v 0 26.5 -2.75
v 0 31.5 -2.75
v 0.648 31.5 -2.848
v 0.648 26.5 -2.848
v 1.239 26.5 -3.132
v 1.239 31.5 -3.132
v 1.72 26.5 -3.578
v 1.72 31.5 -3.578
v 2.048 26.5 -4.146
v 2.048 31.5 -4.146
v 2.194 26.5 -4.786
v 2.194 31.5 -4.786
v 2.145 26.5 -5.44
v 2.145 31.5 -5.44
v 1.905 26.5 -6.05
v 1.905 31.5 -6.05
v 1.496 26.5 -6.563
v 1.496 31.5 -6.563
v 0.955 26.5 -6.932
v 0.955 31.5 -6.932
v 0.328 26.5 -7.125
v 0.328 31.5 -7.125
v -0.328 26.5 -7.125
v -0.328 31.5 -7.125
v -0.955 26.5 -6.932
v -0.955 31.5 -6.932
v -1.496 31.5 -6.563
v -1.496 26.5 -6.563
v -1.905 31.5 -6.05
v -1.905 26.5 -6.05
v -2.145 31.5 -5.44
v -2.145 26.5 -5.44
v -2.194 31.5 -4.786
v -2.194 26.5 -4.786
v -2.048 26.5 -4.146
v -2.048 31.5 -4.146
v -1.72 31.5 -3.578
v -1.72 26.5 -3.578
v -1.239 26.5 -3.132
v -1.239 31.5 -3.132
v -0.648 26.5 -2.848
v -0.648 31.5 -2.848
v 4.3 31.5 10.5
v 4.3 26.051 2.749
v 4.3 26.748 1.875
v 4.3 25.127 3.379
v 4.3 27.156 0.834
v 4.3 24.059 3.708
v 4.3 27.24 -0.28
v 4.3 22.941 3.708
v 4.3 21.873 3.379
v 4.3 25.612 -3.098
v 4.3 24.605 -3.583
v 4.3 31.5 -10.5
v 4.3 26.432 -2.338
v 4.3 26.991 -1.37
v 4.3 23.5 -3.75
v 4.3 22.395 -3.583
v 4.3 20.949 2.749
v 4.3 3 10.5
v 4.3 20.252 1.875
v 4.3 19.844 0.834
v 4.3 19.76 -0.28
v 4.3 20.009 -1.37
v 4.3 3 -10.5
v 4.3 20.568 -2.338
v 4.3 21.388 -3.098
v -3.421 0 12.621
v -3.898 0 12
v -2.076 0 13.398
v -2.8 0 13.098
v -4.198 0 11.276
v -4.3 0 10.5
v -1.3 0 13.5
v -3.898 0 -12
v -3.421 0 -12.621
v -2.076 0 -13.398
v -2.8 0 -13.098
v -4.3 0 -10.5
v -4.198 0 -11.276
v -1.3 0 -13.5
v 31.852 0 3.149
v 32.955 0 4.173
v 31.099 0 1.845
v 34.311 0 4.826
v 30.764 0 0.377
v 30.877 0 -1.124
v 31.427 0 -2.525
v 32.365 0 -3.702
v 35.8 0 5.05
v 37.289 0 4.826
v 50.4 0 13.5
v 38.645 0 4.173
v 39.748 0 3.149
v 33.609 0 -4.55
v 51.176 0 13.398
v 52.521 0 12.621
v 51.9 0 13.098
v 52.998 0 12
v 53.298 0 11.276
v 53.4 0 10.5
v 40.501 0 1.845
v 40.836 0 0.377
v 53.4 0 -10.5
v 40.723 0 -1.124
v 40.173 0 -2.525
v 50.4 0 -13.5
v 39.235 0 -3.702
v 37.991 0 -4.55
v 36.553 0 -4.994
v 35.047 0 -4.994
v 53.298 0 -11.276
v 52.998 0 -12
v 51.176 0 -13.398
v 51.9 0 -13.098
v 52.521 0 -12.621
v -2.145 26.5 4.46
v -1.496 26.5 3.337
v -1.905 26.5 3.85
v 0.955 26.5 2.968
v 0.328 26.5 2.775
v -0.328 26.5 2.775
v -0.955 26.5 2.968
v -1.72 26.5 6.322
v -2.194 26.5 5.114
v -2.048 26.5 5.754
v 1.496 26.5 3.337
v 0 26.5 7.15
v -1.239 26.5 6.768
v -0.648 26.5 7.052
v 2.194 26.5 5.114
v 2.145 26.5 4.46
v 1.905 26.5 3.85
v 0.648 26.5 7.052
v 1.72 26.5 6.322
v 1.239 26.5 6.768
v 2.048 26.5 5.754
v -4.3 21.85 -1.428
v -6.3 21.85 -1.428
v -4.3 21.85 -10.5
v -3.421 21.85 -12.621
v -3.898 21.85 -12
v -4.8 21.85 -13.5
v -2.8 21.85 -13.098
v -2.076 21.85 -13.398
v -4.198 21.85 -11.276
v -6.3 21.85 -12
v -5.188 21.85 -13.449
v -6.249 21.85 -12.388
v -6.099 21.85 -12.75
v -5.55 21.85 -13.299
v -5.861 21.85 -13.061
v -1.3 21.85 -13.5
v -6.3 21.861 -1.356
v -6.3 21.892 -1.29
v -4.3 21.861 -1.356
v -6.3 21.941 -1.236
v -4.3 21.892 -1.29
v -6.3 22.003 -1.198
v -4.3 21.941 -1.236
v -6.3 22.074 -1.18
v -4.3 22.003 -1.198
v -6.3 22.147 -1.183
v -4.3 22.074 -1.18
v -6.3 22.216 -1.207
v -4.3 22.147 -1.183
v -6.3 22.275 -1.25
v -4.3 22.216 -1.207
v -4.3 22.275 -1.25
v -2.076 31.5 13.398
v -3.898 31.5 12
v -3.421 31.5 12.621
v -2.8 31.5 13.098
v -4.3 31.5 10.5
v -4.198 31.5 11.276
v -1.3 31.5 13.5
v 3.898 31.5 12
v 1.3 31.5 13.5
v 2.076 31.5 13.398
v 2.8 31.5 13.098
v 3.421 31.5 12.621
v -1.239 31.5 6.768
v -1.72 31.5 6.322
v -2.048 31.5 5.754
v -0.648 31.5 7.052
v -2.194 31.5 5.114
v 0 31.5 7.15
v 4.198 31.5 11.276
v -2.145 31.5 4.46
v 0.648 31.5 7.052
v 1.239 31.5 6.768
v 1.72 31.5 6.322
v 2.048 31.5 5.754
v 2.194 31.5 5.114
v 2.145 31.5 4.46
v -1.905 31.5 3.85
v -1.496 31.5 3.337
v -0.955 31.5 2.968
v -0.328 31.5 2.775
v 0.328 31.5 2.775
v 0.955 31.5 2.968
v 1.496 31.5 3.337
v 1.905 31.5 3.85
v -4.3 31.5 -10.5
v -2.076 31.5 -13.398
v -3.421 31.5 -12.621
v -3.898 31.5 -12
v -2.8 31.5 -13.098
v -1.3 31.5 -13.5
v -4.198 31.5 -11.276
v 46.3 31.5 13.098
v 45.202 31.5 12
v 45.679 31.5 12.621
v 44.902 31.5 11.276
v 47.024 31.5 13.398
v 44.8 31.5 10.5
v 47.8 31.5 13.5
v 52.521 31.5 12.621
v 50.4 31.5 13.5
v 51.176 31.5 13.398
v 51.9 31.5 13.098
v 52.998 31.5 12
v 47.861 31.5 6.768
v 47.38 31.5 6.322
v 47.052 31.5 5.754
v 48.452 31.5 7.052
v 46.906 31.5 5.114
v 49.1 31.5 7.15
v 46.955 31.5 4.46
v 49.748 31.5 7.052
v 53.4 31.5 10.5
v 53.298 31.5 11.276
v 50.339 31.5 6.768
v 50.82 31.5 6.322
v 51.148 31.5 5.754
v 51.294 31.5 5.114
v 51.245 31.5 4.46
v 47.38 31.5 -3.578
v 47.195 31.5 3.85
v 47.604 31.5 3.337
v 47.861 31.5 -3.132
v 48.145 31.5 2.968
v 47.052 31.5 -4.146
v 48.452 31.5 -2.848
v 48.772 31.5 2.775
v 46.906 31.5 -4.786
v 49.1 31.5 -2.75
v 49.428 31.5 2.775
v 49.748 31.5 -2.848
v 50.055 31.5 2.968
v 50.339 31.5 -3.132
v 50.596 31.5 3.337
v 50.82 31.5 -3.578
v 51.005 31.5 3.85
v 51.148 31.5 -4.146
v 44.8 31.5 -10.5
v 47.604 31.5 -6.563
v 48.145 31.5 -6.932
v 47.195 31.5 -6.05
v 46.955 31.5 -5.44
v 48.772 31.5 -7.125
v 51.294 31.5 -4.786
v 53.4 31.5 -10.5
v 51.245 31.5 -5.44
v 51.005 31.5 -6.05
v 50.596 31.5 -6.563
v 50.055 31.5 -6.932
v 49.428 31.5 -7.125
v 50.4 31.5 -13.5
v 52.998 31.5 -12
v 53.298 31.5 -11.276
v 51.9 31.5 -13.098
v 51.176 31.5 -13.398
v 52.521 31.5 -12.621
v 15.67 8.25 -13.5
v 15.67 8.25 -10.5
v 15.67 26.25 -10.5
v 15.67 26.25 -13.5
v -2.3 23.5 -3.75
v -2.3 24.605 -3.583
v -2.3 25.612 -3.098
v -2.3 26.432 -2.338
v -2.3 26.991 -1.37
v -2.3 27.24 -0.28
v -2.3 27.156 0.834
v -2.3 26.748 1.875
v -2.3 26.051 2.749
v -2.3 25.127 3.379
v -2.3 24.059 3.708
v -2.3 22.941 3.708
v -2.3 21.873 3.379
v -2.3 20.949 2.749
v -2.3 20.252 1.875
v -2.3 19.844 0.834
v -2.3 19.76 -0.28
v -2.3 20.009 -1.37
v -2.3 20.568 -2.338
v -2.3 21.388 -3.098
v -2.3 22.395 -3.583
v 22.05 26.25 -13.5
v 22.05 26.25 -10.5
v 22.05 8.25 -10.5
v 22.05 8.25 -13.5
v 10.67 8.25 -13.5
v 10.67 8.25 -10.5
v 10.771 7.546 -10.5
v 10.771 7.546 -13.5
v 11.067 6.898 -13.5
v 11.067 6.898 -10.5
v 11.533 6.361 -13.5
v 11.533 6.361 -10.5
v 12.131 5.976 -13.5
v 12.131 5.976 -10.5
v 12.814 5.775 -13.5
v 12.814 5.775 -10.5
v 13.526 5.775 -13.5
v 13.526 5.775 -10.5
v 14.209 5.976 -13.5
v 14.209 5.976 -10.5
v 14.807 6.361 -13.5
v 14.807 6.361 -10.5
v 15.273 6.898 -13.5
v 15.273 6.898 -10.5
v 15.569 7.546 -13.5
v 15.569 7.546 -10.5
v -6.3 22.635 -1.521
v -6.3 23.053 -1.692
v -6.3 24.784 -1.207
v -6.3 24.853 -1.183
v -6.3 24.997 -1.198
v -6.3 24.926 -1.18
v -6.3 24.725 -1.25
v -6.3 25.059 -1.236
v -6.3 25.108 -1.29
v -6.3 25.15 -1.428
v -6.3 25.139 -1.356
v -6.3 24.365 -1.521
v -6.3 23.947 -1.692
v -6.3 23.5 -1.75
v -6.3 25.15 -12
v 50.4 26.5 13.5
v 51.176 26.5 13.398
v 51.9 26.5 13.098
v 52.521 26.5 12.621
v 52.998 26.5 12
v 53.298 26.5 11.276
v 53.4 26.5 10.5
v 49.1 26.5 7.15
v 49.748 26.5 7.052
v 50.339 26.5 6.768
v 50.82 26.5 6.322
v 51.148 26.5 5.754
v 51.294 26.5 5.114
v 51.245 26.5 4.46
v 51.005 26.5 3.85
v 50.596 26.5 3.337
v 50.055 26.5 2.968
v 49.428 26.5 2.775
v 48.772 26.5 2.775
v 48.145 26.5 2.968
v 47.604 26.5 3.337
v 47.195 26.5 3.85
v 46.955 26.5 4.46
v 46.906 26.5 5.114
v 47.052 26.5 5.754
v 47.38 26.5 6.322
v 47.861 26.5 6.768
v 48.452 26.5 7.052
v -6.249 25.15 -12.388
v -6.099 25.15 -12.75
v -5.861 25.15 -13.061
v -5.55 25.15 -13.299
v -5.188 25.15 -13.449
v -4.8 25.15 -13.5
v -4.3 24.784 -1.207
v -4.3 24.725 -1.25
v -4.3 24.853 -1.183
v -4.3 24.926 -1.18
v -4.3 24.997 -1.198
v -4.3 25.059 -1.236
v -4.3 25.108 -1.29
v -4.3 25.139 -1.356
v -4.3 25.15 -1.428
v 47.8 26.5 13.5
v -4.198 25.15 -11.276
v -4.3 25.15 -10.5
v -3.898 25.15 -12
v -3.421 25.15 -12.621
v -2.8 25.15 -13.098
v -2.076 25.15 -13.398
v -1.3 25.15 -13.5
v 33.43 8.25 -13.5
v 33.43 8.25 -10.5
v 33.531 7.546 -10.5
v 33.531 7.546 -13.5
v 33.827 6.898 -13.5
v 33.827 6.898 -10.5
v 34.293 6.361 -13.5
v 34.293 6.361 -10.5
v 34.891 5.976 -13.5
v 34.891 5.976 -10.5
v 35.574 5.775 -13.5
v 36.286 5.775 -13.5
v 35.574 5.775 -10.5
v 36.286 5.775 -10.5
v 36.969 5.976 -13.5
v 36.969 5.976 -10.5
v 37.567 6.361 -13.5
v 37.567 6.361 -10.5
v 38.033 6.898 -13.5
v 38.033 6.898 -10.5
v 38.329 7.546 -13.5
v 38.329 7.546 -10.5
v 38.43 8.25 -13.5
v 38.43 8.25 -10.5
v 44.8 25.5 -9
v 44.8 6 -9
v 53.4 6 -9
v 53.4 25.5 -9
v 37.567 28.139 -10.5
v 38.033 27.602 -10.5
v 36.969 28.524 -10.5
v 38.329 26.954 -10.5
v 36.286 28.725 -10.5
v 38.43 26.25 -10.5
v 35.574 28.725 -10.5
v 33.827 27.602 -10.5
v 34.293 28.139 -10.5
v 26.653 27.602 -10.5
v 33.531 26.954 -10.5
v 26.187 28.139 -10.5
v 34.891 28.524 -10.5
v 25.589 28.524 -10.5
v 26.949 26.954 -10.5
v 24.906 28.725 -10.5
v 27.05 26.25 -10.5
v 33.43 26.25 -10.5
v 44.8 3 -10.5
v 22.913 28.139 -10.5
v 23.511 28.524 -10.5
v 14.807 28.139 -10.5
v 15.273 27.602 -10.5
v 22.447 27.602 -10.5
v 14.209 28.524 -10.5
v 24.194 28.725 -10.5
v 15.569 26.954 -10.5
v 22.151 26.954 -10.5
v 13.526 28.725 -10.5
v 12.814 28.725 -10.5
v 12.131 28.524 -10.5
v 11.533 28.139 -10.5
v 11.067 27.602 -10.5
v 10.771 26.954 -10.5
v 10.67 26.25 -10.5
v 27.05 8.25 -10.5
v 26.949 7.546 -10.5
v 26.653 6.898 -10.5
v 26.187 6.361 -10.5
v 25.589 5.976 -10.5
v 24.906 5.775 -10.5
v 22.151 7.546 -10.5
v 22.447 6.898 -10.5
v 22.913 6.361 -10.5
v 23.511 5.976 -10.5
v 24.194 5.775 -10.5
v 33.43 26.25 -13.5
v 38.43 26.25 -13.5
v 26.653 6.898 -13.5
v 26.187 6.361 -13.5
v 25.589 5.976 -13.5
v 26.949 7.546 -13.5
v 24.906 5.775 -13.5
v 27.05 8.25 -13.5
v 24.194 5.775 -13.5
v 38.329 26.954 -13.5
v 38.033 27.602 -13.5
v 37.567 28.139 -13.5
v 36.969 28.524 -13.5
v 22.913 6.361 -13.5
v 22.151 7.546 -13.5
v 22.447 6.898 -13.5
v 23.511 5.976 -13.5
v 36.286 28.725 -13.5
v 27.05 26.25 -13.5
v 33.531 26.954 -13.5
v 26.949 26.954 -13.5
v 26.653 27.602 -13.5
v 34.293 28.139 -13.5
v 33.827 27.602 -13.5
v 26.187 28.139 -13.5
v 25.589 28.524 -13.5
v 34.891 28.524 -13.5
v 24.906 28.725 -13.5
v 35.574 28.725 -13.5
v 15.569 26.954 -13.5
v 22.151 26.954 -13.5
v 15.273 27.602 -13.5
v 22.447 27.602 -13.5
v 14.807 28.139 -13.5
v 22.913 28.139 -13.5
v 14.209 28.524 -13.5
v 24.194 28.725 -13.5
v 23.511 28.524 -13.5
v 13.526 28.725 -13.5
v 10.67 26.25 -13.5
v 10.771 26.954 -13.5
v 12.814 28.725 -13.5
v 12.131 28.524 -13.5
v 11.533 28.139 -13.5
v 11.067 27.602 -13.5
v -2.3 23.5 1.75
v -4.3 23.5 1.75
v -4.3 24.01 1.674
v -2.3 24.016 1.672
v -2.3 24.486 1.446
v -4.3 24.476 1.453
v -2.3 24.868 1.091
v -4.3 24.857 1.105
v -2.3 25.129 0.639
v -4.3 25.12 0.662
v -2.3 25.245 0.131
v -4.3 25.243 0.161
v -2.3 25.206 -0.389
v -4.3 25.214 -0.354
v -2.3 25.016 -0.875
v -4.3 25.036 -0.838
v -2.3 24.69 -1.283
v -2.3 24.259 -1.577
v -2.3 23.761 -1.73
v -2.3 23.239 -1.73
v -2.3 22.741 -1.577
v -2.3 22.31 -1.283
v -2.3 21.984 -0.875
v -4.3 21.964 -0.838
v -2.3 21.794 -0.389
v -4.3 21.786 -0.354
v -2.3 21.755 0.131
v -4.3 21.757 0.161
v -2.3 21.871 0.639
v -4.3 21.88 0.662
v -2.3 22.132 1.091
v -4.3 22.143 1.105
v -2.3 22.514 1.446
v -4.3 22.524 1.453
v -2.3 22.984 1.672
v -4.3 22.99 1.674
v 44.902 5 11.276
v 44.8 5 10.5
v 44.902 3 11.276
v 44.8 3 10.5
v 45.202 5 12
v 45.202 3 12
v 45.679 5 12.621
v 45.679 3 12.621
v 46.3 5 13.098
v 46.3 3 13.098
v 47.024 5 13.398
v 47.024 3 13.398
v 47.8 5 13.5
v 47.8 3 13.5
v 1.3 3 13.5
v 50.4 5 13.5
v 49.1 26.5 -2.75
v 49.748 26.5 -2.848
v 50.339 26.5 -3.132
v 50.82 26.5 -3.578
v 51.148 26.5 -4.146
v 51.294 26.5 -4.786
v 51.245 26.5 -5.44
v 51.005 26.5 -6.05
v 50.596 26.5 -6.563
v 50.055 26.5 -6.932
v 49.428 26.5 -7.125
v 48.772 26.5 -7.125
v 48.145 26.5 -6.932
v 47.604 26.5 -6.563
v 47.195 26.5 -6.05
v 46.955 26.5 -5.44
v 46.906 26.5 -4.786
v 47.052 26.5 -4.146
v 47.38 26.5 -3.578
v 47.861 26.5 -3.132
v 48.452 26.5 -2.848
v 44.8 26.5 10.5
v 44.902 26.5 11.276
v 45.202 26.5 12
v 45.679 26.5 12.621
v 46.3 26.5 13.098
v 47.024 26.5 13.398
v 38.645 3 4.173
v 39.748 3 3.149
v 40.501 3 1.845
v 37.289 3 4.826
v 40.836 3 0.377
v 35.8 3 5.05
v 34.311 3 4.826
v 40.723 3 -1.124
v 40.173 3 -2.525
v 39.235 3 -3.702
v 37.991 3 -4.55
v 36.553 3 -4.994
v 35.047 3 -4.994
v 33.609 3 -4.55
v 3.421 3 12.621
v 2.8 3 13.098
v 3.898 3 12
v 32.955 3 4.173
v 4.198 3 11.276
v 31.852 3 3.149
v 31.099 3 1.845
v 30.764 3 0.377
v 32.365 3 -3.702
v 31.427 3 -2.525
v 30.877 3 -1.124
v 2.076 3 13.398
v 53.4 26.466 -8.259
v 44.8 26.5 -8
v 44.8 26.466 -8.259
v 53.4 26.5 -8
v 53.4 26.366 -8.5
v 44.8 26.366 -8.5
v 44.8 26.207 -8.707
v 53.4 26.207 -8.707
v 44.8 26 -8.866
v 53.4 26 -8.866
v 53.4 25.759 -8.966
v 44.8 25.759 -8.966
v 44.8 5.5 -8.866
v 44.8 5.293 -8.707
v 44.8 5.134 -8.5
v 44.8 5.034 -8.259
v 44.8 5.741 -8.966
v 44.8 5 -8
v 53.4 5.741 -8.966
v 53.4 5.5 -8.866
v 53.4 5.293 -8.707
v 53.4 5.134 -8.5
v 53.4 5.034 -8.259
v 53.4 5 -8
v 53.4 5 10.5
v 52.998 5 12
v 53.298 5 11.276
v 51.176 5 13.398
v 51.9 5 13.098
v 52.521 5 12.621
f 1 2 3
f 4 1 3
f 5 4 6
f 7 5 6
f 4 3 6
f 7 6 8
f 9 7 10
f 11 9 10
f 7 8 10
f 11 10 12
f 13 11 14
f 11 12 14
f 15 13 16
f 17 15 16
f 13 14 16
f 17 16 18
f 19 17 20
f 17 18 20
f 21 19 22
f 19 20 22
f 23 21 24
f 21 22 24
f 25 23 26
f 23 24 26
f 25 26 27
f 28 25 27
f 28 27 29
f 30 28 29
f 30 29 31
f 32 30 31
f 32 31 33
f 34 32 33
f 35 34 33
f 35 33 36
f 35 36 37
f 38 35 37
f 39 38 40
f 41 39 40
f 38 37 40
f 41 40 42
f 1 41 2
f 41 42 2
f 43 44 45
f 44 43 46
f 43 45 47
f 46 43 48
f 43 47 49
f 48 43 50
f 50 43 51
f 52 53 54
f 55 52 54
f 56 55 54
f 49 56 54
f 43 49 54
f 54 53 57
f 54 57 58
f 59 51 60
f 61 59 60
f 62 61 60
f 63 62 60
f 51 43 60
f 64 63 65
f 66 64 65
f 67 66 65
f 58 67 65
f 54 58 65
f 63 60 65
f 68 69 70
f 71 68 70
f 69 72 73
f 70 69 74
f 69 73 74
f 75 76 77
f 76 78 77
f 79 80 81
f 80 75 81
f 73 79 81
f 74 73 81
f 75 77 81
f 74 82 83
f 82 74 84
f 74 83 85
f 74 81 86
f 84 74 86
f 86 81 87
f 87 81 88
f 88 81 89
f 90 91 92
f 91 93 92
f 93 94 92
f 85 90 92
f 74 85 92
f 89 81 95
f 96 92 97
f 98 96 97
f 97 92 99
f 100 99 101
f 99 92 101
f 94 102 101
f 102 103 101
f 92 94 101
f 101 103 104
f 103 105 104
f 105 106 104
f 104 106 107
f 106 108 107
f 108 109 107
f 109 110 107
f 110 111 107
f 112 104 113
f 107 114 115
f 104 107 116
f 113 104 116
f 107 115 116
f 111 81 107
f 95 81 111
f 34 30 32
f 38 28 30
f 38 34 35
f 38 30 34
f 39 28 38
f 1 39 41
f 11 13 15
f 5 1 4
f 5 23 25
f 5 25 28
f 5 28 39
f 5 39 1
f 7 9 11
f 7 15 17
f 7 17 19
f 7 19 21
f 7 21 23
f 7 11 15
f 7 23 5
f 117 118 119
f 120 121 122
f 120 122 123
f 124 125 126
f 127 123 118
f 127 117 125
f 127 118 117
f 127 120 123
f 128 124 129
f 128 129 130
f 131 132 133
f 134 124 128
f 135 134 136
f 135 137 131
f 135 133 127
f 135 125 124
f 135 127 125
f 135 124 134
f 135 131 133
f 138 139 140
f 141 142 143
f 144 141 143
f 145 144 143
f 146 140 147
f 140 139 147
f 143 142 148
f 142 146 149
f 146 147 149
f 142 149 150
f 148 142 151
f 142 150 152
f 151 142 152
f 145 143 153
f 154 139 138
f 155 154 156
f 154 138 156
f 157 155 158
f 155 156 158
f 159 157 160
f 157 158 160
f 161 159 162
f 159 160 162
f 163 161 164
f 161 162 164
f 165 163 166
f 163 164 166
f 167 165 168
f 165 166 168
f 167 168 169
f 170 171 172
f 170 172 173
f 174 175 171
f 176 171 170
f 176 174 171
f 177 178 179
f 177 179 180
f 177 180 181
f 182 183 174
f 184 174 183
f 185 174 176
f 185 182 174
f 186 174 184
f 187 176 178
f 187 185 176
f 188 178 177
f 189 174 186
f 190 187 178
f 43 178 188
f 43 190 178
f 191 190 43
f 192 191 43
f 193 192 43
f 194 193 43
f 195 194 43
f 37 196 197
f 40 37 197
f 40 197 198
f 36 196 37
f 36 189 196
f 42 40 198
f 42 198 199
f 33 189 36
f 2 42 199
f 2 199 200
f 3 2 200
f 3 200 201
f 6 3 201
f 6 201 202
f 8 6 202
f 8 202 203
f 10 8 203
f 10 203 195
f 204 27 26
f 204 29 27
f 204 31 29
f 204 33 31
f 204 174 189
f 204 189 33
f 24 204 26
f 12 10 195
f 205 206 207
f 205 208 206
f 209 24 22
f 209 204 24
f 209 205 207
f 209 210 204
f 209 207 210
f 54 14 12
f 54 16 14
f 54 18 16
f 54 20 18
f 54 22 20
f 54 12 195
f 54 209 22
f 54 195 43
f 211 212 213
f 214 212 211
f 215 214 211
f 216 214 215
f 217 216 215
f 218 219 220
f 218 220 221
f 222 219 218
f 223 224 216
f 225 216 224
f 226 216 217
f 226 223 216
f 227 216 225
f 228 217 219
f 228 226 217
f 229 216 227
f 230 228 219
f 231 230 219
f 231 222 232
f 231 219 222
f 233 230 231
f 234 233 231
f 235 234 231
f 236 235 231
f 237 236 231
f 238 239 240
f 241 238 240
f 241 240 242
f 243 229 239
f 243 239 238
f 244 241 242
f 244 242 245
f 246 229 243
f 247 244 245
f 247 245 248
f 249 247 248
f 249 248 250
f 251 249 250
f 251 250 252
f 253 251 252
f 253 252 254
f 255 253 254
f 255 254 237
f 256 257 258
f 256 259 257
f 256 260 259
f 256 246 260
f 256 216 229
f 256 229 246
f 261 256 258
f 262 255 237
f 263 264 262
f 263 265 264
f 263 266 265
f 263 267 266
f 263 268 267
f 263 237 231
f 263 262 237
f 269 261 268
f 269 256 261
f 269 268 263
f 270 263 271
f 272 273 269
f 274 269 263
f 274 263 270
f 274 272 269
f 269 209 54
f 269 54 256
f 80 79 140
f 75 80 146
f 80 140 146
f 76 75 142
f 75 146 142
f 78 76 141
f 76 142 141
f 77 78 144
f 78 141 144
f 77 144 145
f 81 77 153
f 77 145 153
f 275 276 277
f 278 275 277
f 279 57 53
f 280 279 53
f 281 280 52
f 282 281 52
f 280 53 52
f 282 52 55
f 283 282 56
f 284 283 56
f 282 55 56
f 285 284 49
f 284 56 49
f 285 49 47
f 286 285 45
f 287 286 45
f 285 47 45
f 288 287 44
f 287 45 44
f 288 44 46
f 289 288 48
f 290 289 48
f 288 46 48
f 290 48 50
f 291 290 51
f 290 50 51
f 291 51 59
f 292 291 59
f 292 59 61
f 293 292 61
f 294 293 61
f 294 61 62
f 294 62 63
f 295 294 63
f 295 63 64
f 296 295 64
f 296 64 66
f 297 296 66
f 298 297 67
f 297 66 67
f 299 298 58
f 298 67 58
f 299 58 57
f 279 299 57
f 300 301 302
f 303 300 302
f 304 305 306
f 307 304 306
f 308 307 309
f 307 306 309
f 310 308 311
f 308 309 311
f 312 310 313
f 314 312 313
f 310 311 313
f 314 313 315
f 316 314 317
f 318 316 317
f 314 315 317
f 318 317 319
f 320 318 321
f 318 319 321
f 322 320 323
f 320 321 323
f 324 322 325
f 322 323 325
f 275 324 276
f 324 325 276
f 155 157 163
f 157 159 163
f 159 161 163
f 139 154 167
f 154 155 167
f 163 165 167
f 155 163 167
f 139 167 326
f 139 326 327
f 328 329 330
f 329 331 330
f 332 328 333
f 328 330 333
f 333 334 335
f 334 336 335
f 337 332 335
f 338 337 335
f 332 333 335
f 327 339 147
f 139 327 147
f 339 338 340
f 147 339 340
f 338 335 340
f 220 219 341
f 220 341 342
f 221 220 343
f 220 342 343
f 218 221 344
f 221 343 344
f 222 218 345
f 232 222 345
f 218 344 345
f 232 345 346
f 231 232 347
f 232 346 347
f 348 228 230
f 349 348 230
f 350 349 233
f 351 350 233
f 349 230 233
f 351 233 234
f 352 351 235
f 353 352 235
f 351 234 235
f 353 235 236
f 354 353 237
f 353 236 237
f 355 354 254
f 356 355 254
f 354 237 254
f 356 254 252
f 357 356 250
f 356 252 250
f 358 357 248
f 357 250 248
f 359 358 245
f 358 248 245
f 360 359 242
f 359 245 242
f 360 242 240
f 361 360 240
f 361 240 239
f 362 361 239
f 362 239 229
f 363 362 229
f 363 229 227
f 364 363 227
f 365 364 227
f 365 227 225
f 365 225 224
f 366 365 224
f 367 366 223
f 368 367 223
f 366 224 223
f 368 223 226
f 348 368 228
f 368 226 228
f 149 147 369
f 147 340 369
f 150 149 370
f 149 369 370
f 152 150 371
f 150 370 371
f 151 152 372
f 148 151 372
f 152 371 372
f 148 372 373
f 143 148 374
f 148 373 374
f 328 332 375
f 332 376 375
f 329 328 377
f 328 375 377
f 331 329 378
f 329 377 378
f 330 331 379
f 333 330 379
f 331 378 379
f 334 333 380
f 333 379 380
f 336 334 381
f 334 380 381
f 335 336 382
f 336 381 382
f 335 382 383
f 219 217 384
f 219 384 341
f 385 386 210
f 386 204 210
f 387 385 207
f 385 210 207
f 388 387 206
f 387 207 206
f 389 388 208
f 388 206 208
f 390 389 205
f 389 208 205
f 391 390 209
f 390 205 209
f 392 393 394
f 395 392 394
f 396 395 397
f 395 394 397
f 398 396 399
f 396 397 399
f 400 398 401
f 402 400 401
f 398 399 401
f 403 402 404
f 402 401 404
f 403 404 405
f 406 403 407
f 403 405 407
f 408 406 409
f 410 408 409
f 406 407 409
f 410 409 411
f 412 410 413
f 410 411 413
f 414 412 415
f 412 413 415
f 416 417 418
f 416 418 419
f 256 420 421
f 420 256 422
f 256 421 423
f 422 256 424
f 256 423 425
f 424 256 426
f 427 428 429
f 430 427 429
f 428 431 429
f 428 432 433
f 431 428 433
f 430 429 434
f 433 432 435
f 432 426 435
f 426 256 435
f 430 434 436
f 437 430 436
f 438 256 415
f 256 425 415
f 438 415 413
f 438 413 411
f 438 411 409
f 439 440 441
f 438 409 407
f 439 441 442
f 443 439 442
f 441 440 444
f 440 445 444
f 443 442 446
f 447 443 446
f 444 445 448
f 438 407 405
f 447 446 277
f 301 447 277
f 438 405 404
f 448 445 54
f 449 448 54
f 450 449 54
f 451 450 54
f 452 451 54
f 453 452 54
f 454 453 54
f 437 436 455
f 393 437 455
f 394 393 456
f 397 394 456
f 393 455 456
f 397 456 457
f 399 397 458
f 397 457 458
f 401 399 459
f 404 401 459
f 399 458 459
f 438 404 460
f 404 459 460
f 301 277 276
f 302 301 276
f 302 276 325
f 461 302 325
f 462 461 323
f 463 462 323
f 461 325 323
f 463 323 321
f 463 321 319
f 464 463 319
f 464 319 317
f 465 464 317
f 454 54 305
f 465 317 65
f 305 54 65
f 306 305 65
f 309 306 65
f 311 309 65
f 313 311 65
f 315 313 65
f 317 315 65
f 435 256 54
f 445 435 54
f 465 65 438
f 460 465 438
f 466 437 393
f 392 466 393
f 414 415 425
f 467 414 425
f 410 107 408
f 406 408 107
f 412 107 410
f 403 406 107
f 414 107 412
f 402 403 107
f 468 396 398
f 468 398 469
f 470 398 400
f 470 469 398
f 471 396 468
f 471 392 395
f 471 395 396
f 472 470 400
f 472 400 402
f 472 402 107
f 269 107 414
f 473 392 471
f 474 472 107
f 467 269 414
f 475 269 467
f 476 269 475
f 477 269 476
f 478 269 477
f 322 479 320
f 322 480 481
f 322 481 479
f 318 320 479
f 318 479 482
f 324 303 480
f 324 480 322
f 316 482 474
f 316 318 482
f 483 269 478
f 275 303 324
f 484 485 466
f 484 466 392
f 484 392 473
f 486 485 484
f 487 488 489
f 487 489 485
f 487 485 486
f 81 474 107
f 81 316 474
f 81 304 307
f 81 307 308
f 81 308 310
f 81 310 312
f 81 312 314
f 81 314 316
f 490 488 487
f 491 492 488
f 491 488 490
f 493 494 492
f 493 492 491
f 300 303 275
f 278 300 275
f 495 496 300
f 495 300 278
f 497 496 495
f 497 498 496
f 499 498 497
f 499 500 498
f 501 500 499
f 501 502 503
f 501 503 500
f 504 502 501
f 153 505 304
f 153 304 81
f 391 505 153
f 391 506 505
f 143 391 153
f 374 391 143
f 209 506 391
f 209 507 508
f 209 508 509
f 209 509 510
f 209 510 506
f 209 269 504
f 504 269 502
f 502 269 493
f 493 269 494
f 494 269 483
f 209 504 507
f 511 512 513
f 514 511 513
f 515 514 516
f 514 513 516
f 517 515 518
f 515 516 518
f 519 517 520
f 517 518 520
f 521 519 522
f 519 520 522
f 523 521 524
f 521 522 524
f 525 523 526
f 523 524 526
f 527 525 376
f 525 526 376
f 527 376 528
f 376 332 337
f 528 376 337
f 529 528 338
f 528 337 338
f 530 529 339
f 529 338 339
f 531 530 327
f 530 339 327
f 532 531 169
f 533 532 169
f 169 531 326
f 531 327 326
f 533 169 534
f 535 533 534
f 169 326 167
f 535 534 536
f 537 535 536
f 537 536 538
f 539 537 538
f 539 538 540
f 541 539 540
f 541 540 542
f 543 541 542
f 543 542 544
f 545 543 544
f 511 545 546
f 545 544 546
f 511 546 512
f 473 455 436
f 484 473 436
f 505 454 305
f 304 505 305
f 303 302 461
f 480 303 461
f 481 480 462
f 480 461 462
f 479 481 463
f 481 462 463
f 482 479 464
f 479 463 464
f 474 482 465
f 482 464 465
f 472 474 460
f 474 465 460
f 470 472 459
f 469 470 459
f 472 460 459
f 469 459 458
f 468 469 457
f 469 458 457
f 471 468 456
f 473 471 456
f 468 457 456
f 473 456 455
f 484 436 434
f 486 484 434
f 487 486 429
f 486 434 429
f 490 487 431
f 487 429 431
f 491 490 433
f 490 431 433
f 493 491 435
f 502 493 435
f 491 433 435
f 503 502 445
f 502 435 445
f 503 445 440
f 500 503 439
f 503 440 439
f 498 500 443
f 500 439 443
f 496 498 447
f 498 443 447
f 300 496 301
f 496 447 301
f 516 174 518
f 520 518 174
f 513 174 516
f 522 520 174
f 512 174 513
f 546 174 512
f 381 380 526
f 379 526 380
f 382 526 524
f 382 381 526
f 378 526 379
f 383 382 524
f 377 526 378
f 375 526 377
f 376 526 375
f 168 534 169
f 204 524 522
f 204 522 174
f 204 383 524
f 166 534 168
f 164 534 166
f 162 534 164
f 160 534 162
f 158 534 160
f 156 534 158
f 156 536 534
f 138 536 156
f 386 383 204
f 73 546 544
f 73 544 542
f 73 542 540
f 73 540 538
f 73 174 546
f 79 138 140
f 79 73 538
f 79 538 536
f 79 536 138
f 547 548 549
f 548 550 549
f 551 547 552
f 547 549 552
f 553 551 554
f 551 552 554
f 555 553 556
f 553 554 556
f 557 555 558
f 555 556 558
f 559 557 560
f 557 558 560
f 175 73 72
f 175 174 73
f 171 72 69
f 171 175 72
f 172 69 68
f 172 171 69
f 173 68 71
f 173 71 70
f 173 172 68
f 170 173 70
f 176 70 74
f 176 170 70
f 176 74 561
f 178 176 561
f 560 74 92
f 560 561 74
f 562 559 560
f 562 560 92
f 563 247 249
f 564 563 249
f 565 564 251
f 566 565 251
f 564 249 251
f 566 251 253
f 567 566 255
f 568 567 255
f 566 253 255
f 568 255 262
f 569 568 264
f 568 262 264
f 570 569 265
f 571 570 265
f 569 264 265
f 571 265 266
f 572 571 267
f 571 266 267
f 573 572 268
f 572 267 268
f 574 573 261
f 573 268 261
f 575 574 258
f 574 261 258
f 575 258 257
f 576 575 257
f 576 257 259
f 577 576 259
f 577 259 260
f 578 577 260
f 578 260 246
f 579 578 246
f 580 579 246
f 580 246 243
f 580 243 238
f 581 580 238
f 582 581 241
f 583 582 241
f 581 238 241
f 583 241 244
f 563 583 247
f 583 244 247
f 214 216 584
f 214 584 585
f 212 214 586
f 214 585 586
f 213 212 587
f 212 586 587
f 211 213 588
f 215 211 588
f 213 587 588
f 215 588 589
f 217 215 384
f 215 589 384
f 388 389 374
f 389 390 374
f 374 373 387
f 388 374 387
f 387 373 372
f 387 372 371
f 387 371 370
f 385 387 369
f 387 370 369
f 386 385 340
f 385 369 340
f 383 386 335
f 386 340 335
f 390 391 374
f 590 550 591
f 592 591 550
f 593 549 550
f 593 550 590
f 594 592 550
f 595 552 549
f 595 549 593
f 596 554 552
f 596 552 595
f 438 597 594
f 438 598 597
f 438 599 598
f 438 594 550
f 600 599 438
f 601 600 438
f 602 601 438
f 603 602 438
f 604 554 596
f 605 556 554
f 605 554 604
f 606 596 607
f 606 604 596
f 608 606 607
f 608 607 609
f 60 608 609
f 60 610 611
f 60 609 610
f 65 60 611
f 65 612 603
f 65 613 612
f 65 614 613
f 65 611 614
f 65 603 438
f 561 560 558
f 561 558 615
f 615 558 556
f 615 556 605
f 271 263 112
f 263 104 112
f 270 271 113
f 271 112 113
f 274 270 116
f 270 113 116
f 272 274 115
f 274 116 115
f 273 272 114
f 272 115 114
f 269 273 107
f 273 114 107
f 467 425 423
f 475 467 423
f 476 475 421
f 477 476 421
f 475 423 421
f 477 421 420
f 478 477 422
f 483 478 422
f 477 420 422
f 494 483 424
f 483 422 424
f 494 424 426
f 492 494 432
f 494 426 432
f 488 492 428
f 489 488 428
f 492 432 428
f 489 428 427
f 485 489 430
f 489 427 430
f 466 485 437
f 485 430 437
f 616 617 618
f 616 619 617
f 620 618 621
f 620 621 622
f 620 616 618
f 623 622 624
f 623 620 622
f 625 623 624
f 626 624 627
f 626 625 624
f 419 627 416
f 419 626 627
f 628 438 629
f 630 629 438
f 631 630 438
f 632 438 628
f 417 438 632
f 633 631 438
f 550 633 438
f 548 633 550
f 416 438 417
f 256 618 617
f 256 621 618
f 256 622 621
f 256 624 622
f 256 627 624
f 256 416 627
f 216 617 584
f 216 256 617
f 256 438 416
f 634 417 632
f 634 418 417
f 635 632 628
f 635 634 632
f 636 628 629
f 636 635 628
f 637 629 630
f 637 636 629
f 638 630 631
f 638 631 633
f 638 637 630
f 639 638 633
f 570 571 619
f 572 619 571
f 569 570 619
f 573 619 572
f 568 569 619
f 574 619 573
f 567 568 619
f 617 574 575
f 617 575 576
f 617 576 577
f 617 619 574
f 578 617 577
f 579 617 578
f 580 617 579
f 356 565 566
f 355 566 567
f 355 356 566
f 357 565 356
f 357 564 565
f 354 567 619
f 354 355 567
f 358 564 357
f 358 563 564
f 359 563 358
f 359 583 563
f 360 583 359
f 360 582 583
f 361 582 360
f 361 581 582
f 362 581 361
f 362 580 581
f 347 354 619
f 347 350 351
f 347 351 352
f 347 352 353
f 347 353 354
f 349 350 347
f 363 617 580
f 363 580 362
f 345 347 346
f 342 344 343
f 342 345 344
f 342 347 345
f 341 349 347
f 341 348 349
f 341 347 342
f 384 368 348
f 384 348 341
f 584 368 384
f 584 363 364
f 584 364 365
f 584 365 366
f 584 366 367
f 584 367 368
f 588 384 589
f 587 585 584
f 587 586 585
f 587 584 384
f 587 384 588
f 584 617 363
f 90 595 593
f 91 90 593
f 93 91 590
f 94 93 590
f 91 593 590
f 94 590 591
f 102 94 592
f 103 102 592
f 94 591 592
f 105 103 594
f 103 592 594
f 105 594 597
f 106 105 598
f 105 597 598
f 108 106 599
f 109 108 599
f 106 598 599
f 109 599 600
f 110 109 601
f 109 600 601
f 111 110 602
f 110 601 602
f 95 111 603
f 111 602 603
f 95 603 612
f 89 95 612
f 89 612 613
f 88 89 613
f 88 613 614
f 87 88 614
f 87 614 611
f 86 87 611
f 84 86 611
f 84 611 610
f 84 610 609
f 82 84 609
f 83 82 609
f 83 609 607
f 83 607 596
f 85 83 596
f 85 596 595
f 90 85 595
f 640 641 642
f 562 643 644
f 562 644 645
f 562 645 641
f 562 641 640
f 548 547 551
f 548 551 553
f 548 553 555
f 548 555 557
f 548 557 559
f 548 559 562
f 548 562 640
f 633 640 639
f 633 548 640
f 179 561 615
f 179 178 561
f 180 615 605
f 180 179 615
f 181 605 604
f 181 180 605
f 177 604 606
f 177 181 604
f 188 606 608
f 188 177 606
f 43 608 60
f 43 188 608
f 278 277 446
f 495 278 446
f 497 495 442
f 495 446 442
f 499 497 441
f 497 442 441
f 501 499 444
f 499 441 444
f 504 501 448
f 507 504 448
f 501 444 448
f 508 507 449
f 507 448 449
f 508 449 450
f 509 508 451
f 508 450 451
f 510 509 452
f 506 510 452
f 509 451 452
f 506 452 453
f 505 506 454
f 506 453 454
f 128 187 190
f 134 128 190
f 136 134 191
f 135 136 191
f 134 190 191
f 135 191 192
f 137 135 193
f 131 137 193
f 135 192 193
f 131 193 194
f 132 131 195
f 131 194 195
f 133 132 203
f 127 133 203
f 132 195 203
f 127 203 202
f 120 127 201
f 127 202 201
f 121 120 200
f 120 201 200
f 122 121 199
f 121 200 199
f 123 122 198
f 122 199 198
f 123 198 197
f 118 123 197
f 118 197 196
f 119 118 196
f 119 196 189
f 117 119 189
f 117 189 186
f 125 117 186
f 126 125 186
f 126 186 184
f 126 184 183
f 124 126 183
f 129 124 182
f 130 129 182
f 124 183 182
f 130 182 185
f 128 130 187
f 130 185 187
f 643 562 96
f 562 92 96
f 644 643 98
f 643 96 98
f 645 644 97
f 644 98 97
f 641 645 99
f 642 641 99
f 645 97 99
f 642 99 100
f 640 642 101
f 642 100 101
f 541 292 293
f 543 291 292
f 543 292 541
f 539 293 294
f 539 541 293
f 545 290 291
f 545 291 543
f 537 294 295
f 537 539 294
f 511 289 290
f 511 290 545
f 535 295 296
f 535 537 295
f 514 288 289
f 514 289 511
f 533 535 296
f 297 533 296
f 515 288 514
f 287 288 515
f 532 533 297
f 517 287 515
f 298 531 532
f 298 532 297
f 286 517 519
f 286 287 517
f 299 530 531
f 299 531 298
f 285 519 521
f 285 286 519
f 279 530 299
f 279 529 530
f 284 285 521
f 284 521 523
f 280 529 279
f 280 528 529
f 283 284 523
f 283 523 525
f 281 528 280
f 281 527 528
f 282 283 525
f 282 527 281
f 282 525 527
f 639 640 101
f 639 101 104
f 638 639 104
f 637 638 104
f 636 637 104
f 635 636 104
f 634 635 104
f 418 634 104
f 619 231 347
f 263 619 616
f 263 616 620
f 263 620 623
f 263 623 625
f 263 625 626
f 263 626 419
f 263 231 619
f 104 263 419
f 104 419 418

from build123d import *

# Parameters (mm, degrees)
SKETCH1_W           = 8.6
SKETCH1_H           = 27.000000000000004
BOSS_EXTRUDE1_DEPTH = 31.5
SKETCH2_W           = 27
SKETCH2_H           = 3
BOSS_EXTRUDE2_DEPTH = 40.5
BOSS_EXTRUDE3_DEPTH = 40.5
BOSS_EXTRUDE4_DEPTH = 31.5
CUT_EXTRUDE6_DEPTH  = 67.48165160403282
SKETCH5_R           = 2.200000000000013
SKETCH5_R_2         = 2.200000000000042
SKETCH5_R_3         = 2.2000000000000135
SKETCH5_R_4         = 2.2000000000000384
CUT_EXTRUDE1_DEPTH  = 5
CUT_EXTRUDE2_DEPTH  = 10
SKETCH8_R           = 5.050000000000001
CUT_EXTRUDE3_DEPTH  = 63.016610678107845
SKETCH9_R           = 1.7500000000000042
CUT_EXTRUDE4_DEPTH  = 8.6
SKETCH10_R          = 3.7500000000000013
CUT_EXTRUDE5_DEPTH  = 6.6
BOSS_EXTRUDE5_START = 2
BOSS_EXTRUDE5_DEPTH = 2
FILLET1_R           = 3
FILLET2_R           = 3
FILLET3_R           = 1
FILLET4_R           = 0.25
FILLET5_R           = 1.5


with BuildPart() as part:
    # Sketch1 → Boss-Extrude1 (new body)
    with BuildSketch(Plane(origin=(0, 0, 0), x_dir=(1, 0, 0), z_dir=(0, 1, 0))):
        Rectangle(SKETCH1_W, SKETCH1_H)
    extrude(amount=BOSS_EXTRUDE1_DEPTH)

    # Sketch2 → Boss-Extrude2 (add)
    with BuildSketch(Plane(origin=(4.3, 0, 0), x_dir=(0, 0, -1), z_dir=(1, 0, 0))):
        with Locations((-1.78e-15, 1.5)):
            Rectangle(SKETCH2_W, SKETCH2_H)
    extrude(amount=BOSS_EXTRUDE2_DEPTH)

    # Sketch3 → Boss-Extrude3 (add)
    with BuildSketch(Plane(origin=(4.3, 0, 0), x_dir=(0, 0, -1), z_dir=(1, 0, 0))):
        Polygon((10.499999999999998, 31.5), (10.500000000000002, 2.9999999999999996), (13.499999999999998, 3), (13.499999999999998, 31.5), align=None)
    extrude(amount=BOSS_EXTRUDE3_DEPTH)

    # Sketch4 → Boss-Extrude4 (add)
    with BuildSketch(Plane(origin=(0, 31.5, 0), x_dir=(1, 0, 0), z_dir=(0, 1, 0))):
        Polygon((44.8, 13.499999999999998), (44.8, -13.5), (53.4, -13.5), (53.4, 13.500000000000004), align=None)
    extrude(amount=-BOSS_EXTRUDE4_DEPTH)

    # Sketch12 → Cut-Extrude6 (cut, through all)
    with BuildSketch(Plane.XY.offset(-10.500000000000002)):
        with BuildLine():
            Line((38.43, 8.25), (38.43, 26.249999999999996))
            ThreePointArc((38.43, 26.249999999999996), (35.93, 28.750000000000004), (33.42999999999999, 26.249999999999996))
            Line((33.42999999999999, 26.249999999999996), (33.42999999999999, 8.25))
            ThreePointArc((33.42999999999999, 8.25), (35.93000000000001, 5.750000000000007), (38.43, 8.25))
        make_face()
        with BuildLine():
            Line((27.049999999999997, 8.25), (27.049999999999997, 26.249999999999996))
            ThreePointArc((27.049999999999997, 26.249999999999996), (24.55, 28.75), (22.049999999999994, 26.249999999999996))
            Line((22.049999999999994, 26.249999999999996), (22.049999999999994, 8.25))
            ThreePointArc((22.049999999999994, 8.25), (24.55, 5.7500000000000036), (27.049999999999997, 8.25))
        make_face()
        with BuildLine():
            Line((15.670000000000003, 8.250000000000014), (15.670000000000003, 26.25))
            ThreePointArc((15.670000000000003, 26.25), (13.170000000000002, 28.75000000000001), (10.669999999999998, 26.25))
            Line((10.669999999999998, 26.25), (10.669999999999998, 8.250000000000014))
            ThreePointArc((10.669999999999998, 8.250000000000014), (13.169999999999995, 5.750000000000018), (15.670000000000003, 8.250000000000014))
        make_face()
    extrude(amount=-CUT_EXTRUDE6_DEPTH, mode=Mode.SUBTRACT)

    # Sketch5 → Cut-Extrude1 (cut)
    with BuildSketch(Plane(origin=(0, 31.5, 0), x_dir=(1, 0, 0), z_dir=(0, 1, 0))):
        with Locations(Location((49.099999999999994, 4.95, 0), (0, 0, 270))):
            Circle(SKETCH5_R)
        with Locations(Location((49.099999999999994, -4.949999999999998, 0), (0, 0, 270))):
            Circle(SKETCH5_R_2)
        with Locations(Location((0, 4.949999999999999, 0), (0, 0, 270))):
            Circle(SKETCH5_R_3)
        with Locations(Location((0, -4.949999999999999, 0), (0, 0, 270))):
            Circle(SKETCH5_R_4)
    extrude(amount=-CUT_EXTRUDE1_DEPTH, mode=Mode.SUBTRACT)

    # Sketch6 → Cut-Extrude2 (cut)
    with BuildSketch(Plane.ZY.offset(-44.8)):
        Polygon((13.5, 26.500000000000004), (13.500000000000014, 5), (-9, 4.999999999999998), (-9, 26.5), align=None)
    extrude(amount=-CUT_EXTRUDE2_DEPTH, mode=Mode.SUBTRACT)

    # Sketch8 → Cut-Extrude3 (cut, through all)
    with BuildSketch(Plane(origin=(0, 3, 0), x_dir=(1, 0, 0), z_dir=(0, 1, 0))):
        with Locations(Location((35.8, -1.75e-15, 0), (0, 0, 270))):
            Circle(SKETCH8_R)
    extrude(amount=-CUT_EXTRUDE3_DEPTH, mode=Mode.SUBTRACT)

    # Sketch9 → Cut-Extrude4 (cut)
    with BuildSketch(Plane.ZY.offset(4.3)):
        with Locations((0, 23.5)):
            Circle(SKETCH9_R)
    extrude(amount=-CUT_EXTRUDE4_DEPTH, mode=Mode.SUBTRACT)

    # Sketch10 → Cut-Extrude5 (cut)
    with BuildSketch(Plane(origin=(4.3, 0, 0), x_dir=(0, 0, -1), z_dir=(1, 0, 0))):
        with Locations((0, 23.5)):
            Circle(SKETCH10_R)
    extrude(amount=-CUT_EXTRUDE5_DEPTH, mode=Mode.SUBTRACT)

    # Sketch11 → Boss-Extrude5 (add)
    with BuildSketch(Plane.ZY.offset(4.3).offset(BOSS_EXTRUDE5_START)):
        with BuildLine():
            Line((-13.5, 21.85), (-13.5, 25.15))
            Line((-13.5, 25.15), (-0.5830951894845463, 25.15))
            ThreePointArc((-0.5830951894845463, 25.15), (-1.750000000000004, 23.5), (-0.5830951894845463, 21.85))
            Line((-0.5830951894845463, 21.85), (-13.5, 21.85))
        make_face()
    extrude(amount=-BOSS_EXTRUDE5_DEPTH)

    # Fillet1
    fillet1_edges = [part.edges().sort_by_distance(p)[0] for p in [
        (44.8, 29, 13.5),
        (53.4, 29, 13.5),
        (53.4, 15.75, -13.500000000000004),
        (53.4, 2.5, 13.5),
        (44.8, 4, 13.5),
        (4.3, 17.25, 13.5),
    ]]
    fillet(fillet1_edges, radius=FILLET1_R)

    # Fillet2
    fillet2_edges = [part.edges().sort_by_distance(p)[0] for p in [
        (-4.3, 10.925, -13.5),
        (-4.3, 15.75, 13.5),
        (-4.3, 28.325, -13.5),
    ]]
    fillet(fillet2_edges, radius=FILLET2_R)

    # Fillet3
    fillet3_edges = [part.edges().sort_by_distance(p)[0] for p in [
        (49.099999999999994, 26.5, -9.000000000000002),
        (49.099999999999994, 4.999999999999998, -9.000000000000002),
    ]]
    fillet(fillet3_edges, radius=FILLET3_R)

    # Fillet4
    fillet4_edges = [part.edges().sort_by_distance(p)[0] for p in [
        (-5.3, 25.15, -0.5830951894845464),
        (-5.3, 21.85, -0.5830951894845464),
    ]]
    fillet(fillet4_edges, radius=FILLET4_R)

    # Fillet5
    fillet5_edges = [part.edges().sort_by_distance(p)[0] for p in [
        (-6.3, 23.5, -13.5),
    ]]
    fillet(fillet5_edges, radius=FILLET5_R)


solid = part.part
